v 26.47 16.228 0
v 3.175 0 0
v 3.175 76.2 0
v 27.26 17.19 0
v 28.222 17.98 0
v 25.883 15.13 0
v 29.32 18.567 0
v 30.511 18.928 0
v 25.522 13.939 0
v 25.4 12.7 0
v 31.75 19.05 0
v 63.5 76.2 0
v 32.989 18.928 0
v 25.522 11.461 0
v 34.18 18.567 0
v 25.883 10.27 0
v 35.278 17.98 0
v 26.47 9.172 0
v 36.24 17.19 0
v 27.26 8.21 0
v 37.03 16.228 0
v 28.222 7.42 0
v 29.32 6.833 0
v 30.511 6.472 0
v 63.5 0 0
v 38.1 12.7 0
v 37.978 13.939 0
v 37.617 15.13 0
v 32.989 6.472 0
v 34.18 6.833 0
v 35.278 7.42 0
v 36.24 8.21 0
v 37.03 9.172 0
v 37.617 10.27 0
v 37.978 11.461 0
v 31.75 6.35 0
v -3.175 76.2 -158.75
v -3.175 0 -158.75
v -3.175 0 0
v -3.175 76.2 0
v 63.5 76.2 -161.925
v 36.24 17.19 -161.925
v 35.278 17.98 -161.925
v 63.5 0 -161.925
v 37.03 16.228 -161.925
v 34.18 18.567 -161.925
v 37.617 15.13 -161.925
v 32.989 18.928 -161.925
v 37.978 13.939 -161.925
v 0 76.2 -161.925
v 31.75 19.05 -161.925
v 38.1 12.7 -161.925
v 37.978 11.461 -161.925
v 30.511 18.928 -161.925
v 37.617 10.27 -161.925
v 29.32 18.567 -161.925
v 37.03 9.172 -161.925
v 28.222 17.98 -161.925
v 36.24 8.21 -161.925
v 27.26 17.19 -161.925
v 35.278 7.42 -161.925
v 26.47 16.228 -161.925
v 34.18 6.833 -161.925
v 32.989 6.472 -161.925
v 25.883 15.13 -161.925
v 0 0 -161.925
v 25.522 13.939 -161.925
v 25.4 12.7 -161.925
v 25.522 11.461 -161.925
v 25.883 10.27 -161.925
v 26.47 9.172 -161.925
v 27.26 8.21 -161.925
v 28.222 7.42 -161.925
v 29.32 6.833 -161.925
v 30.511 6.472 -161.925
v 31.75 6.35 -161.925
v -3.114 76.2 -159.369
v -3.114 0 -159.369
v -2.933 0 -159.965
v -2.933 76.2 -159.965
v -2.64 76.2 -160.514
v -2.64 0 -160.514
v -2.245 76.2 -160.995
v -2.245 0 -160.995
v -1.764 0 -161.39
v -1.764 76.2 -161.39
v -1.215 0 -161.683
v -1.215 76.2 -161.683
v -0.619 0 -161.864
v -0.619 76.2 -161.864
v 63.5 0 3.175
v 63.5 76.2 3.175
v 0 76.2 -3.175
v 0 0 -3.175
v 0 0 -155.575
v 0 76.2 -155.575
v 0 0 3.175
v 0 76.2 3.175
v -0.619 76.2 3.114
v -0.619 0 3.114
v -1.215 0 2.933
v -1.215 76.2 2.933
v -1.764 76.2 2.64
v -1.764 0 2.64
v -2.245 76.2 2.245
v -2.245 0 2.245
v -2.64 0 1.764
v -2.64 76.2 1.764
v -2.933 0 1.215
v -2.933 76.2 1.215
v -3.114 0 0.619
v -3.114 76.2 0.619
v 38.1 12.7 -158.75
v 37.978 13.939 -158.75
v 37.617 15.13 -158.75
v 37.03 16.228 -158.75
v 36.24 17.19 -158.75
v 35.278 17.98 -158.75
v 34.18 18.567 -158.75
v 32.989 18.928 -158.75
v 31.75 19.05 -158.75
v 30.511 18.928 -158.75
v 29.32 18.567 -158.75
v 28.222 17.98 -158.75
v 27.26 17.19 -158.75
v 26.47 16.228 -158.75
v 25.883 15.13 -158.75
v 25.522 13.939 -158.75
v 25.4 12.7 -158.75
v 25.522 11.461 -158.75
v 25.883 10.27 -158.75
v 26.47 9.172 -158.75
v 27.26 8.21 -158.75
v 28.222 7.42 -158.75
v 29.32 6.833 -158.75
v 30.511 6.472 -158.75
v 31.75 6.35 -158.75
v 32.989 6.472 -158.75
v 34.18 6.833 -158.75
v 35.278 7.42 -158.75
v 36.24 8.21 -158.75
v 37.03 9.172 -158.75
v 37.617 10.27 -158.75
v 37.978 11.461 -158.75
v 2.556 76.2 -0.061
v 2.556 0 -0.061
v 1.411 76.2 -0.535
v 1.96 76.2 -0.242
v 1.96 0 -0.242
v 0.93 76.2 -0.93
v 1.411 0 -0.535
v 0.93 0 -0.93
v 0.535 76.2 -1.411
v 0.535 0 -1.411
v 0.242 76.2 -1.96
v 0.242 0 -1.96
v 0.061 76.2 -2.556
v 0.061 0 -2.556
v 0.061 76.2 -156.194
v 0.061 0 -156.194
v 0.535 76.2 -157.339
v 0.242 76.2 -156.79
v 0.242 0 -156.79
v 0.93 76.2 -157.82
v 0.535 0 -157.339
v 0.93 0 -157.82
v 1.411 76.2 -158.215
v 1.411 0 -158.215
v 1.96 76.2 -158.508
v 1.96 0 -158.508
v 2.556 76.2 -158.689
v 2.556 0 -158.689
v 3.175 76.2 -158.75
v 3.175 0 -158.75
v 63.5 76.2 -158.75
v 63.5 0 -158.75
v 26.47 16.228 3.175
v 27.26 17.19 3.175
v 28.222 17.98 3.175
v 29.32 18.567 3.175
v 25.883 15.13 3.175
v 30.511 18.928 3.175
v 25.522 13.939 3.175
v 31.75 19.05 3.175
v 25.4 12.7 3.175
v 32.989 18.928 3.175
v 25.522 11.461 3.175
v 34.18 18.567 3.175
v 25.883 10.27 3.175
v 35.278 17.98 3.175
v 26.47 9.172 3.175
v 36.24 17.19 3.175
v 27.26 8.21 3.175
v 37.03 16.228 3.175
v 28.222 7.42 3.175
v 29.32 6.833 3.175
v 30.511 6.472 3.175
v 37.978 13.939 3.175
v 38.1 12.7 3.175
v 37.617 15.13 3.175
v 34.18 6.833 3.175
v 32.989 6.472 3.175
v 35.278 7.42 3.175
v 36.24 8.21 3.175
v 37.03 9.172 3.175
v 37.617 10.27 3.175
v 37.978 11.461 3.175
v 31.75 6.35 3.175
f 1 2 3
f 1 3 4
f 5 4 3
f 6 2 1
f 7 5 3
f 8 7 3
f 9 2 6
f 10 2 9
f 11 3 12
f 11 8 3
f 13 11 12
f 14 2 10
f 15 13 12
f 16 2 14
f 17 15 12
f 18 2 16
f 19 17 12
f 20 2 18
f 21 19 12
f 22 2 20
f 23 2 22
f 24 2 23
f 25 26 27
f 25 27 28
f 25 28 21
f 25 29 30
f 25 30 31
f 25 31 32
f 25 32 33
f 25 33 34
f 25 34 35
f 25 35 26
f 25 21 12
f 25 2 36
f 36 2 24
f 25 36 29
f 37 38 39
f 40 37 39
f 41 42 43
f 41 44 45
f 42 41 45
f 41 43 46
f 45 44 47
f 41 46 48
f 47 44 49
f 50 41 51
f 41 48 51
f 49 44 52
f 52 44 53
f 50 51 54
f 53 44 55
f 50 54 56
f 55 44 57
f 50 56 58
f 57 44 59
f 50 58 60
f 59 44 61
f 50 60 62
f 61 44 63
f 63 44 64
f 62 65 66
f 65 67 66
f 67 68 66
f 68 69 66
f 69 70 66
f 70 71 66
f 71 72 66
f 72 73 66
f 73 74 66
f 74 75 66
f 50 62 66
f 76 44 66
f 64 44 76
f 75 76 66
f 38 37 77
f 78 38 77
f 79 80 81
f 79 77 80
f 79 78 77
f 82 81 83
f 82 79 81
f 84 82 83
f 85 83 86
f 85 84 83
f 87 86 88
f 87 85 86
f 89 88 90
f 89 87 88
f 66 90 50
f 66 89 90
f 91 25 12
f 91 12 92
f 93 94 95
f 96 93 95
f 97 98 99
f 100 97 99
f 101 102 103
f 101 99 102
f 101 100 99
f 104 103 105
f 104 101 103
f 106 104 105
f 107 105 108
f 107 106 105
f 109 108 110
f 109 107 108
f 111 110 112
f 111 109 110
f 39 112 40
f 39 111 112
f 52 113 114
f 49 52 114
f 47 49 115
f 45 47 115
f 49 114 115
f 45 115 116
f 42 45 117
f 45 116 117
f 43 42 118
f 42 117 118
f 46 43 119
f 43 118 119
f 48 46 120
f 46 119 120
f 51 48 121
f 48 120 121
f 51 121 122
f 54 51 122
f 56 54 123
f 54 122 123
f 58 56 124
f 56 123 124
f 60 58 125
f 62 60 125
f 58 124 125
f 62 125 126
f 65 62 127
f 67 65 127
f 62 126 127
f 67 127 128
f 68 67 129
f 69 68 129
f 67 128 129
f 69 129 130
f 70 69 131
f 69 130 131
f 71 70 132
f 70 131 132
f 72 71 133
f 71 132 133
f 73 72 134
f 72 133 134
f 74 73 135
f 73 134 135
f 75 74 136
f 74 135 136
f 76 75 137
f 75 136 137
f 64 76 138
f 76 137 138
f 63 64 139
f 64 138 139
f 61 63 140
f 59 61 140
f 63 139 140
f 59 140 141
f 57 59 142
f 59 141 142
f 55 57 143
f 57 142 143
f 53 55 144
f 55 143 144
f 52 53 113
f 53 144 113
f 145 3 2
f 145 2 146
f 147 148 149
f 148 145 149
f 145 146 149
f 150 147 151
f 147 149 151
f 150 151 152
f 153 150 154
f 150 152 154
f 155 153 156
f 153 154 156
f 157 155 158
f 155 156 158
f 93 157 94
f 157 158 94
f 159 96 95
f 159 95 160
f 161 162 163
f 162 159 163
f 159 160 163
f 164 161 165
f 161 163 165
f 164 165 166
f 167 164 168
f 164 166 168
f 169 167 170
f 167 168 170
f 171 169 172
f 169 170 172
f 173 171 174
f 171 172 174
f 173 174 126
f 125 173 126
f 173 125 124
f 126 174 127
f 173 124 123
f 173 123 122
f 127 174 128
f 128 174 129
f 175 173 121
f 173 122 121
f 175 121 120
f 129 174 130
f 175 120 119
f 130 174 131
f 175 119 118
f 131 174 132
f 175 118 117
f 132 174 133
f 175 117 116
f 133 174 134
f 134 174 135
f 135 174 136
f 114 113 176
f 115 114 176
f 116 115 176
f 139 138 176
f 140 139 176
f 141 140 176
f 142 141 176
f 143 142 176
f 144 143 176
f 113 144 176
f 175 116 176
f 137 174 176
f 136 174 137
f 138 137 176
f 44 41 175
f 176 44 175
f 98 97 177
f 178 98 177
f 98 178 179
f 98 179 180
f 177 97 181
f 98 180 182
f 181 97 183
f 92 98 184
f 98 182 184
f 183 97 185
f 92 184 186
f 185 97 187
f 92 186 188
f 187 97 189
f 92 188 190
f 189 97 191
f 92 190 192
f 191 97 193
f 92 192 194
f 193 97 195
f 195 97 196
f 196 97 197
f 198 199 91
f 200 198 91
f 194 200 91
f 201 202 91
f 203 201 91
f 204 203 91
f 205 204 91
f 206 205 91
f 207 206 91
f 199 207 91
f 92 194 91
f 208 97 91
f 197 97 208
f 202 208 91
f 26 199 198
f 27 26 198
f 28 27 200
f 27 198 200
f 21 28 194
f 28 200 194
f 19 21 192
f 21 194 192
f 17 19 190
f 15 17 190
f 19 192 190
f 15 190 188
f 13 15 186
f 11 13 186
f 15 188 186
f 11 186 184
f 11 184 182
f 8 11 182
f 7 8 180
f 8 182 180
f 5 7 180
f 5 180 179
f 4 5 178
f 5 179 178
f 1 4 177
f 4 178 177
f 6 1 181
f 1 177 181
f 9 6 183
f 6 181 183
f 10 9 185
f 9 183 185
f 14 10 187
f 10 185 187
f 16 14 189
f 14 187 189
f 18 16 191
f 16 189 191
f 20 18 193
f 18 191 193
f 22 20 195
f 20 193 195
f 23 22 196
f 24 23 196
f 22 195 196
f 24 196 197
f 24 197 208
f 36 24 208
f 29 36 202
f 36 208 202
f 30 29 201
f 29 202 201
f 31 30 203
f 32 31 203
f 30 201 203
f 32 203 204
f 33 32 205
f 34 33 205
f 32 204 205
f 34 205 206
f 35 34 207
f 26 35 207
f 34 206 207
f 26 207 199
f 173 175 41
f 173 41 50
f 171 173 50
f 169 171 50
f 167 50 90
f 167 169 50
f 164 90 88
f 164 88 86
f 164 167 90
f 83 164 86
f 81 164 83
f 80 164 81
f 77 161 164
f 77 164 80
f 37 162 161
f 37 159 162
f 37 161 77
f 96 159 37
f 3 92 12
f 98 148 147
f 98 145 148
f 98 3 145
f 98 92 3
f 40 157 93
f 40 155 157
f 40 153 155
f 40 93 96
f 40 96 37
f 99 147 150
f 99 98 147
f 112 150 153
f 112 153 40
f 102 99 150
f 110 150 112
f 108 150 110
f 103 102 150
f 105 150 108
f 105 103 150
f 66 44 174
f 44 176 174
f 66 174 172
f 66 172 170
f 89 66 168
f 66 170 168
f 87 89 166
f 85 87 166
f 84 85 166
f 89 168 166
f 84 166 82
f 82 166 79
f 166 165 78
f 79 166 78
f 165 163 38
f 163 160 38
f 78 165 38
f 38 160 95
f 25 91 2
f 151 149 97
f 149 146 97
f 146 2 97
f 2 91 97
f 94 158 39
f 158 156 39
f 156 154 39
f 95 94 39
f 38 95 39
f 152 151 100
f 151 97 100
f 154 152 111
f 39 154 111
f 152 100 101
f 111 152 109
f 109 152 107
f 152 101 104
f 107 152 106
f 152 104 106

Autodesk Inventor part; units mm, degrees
ref_plane "YZ Plane" through (0, 0, 0) normal (1, 0, 0) x (0, 1, 0)
ref_plane "XZ Plane" through (0, 0, 0) normal (0, 1, 0) x (-1, 0, 0)
ref_plane "XY Plane" through (0, 0, 0) normal (0, 0, 1) x (1, 0, 0)
sketch "Sketch1" plane through (0, 0, 0) normal (0, 1, 0) x (-1, 0, 0)
  line L0 (0, -3.175) -> (0, -155.575)
  line L1 (-3.175, -158.75) -> (-63.5, -158.75)
  line L2 (-3.175, 0) -> (-63.5, 0)
  line L3 (-63.5, -161.925) -> (0, -161.925)
  line L4 (3.175, -158.75) -> (3.175, 0)
  line L5 (0, 3.175) -> (-63.5, 3.175)
  line L6 (-63.5, 0) -> (-63.5, 3.175)
  line L7 (-63.5, -161.925) -> (-63.5, -158.75)
  arc A0 (3.175, 0) -> (0, 3.175) centre (0, 0) ccw
  arc A1 (0, -3.175) -> (-3.175, 0) centre (-3.175, -3.175) ccw
  arc A2 (-3.175, -158.75) -> (0, -155.575) centre (-3.175, -155.575) ccw
  arc A3 (0, -161.925) -> (3.175, -158.75) centre (0, -158.75) ccw
  point P0 (0, 0)
  point P1 (0, -158.75)
  dimension "d0" = 158.75
  dimension "d1" = 63.5
  dimension "d2" = 63.5
  dimension "d3" = 3.175
  dimension "d4" = 3.175
extrude "Extrusion1" add sketch "Sketch1" along normal blind 76.2
sketch "Sketch2" plane through (0, 0, 3.175) normal (0, 0, 1) x (1, 0, 0)
  circle A0 centre (31.75, 12.7) radius 6.35
  line L0 (63.5, 0) -> (63.5, 76.2) projected
  line L1 (0, 76.2) -> (63.5, 76.2) projected
  point P0 (0, 0)
  dimension "d7" = 12.7
  dimension "d8" = 31.75
  dimension "d9" = 63.5
extrude "Extrusion2" cut sketch "Sketch2" against normal through all
properties part number "C chanel Short"
